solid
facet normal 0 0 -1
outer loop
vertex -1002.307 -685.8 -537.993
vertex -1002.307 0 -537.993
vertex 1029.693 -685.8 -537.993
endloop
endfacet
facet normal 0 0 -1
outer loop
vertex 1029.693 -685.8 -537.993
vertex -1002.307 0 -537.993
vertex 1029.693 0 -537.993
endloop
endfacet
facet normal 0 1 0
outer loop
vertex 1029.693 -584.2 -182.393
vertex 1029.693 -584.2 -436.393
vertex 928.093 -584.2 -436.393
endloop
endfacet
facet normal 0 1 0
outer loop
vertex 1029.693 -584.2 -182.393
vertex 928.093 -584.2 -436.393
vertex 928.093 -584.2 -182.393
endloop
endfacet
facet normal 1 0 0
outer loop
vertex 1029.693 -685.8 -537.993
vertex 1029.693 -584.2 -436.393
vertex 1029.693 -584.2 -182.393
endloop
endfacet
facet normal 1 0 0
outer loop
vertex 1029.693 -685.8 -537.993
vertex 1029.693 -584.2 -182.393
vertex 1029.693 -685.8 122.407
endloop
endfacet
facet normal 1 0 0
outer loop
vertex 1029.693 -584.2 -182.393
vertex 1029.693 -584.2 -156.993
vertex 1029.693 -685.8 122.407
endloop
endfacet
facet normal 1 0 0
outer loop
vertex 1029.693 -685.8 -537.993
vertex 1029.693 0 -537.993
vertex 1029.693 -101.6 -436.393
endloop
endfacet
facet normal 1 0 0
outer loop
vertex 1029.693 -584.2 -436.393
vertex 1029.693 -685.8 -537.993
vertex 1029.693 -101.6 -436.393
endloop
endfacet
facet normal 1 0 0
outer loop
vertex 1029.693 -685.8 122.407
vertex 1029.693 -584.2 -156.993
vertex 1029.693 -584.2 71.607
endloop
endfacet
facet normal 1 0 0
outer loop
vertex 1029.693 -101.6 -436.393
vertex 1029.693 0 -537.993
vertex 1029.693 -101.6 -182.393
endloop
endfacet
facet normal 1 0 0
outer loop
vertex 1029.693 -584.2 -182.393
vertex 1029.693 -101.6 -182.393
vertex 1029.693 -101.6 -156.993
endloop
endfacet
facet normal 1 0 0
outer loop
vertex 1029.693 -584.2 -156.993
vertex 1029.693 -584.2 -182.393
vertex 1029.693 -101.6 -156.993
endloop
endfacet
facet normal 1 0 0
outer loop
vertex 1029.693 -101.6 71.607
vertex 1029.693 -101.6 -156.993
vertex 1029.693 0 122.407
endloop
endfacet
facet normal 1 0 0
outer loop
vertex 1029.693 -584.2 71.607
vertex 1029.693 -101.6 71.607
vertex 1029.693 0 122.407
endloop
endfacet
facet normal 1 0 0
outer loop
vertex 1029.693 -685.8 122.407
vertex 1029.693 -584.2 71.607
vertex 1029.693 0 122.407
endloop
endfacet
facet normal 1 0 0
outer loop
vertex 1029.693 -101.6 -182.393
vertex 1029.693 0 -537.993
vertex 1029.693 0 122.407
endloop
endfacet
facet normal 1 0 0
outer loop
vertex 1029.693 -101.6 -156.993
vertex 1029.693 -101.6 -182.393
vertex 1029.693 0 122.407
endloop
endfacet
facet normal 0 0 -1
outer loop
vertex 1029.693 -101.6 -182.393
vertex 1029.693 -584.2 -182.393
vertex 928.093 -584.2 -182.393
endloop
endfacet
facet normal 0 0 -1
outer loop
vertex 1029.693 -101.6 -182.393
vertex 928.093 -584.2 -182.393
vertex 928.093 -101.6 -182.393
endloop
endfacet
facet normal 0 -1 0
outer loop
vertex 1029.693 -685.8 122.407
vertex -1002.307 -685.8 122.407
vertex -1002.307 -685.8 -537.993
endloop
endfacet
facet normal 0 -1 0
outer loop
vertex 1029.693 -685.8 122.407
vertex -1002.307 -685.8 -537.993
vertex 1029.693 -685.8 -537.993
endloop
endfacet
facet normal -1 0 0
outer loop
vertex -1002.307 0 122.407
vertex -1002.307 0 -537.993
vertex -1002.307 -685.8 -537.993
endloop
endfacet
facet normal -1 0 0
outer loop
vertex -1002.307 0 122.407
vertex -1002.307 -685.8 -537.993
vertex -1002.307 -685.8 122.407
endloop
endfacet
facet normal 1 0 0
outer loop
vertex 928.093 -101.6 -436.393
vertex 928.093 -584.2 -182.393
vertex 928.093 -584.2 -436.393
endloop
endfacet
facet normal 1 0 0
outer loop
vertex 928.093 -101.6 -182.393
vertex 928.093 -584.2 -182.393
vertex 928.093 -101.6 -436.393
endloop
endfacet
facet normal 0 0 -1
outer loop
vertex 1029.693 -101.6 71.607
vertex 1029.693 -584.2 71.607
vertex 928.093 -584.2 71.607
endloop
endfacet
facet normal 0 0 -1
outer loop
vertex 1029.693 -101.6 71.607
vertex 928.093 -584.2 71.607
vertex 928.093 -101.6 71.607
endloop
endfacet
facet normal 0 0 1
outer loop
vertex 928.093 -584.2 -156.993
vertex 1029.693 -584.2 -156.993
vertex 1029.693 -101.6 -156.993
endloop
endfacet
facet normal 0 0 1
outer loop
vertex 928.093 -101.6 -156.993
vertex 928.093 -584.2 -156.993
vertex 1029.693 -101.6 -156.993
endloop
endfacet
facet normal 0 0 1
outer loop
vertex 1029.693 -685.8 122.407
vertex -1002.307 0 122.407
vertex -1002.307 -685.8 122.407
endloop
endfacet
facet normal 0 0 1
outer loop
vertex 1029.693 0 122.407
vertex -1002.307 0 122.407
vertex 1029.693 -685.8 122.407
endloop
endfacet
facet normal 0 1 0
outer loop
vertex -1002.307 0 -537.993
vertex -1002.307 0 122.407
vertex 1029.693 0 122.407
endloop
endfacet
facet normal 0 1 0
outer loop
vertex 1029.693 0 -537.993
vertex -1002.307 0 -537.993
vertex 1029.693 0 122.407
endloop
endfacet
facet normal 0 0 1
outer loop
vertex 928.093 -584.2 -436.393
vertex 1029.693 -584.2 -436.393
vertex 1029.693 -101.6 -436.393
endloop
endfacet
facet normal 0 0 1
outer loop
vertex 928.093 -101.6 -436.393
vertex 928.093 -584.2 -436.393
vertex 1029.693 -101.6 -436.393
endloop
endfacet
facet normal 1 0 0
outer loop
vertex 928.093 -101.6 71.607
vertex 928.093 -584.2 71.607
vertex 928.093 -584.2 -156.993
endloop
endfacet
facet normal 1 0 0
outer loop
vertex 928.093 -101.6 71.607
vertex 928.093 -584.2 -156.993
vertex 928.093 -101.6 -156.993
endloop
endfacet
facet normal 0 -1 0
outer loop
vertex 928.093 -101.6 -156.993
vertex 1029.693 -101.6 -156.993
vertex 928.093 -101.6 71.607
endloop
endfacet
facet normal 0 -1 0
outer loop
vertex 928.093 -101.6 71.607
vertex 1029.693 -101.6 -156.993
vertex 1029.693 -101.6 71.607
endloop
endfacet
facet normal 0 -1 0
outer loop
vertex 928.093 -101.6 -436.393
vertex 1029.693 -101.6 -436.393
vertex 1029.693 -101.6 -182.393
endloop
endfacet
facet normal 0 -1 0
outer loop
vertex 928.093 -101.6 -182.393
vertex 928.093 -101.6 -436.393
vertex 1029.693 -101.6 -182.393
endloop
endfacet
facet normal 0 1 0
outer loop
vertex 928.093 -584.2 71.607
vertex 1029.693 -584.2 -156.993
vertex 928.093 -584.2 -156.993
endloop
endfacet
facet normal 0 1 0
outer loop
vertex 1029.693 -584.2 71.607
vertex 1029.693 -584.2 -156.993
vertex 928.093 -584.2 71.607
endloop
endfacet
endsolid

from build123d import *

# Parameters (mm, degrees)
F0_W     = 2032
F0_H     = 660.4
F1_DEPTH = 685.8
F2_W     = 482.6
F2_H     = 228.6
F2_H_2   = 254
F3_DEPTH = 101.6
F4_W     = 482.6
F4_H     = 254
F5_DEPTH = 101.6


with BuildPart() as f1:
    # F0 (on Front) → F1 (new body)
    with BuildSketch(Plane.XZ):
        with Locations((13.692988, -207.793446)):
            Rectangle(F0_W, F0_H)
    extrude(amount=F1_DEPTH)

    # F2 (on face) → F3 (cut)
    with BuildSketch(Plane.YZ.offset(1029.692988)):
        with Locations((-342.9, -42.693446)):
            Rectangle(F2_W, F2_H)
        with Locations((-342.9, -309.393446)):
            Rectangle(F2_W, F2_H_2)
    extrude(amount=-F3_DEPTH, mode=Mode.SUBTRACT)

    # F4 (on face) → F5 (join)
    with BuildSketch(Plane(origin=(-1002.307012, 0, 0), x_dir=(0, -1, 0), z_dir=(-1, 0, 0))):
        with Locations((342.9, -55.393446)):
            Rectangle(F4_W, F4_H)
        with Locations((342.9, -334.793446)):
            Rectangle(F4_W, F4_H)
    extrude(amount=-F5_DEPTH)


solid = f1.part
